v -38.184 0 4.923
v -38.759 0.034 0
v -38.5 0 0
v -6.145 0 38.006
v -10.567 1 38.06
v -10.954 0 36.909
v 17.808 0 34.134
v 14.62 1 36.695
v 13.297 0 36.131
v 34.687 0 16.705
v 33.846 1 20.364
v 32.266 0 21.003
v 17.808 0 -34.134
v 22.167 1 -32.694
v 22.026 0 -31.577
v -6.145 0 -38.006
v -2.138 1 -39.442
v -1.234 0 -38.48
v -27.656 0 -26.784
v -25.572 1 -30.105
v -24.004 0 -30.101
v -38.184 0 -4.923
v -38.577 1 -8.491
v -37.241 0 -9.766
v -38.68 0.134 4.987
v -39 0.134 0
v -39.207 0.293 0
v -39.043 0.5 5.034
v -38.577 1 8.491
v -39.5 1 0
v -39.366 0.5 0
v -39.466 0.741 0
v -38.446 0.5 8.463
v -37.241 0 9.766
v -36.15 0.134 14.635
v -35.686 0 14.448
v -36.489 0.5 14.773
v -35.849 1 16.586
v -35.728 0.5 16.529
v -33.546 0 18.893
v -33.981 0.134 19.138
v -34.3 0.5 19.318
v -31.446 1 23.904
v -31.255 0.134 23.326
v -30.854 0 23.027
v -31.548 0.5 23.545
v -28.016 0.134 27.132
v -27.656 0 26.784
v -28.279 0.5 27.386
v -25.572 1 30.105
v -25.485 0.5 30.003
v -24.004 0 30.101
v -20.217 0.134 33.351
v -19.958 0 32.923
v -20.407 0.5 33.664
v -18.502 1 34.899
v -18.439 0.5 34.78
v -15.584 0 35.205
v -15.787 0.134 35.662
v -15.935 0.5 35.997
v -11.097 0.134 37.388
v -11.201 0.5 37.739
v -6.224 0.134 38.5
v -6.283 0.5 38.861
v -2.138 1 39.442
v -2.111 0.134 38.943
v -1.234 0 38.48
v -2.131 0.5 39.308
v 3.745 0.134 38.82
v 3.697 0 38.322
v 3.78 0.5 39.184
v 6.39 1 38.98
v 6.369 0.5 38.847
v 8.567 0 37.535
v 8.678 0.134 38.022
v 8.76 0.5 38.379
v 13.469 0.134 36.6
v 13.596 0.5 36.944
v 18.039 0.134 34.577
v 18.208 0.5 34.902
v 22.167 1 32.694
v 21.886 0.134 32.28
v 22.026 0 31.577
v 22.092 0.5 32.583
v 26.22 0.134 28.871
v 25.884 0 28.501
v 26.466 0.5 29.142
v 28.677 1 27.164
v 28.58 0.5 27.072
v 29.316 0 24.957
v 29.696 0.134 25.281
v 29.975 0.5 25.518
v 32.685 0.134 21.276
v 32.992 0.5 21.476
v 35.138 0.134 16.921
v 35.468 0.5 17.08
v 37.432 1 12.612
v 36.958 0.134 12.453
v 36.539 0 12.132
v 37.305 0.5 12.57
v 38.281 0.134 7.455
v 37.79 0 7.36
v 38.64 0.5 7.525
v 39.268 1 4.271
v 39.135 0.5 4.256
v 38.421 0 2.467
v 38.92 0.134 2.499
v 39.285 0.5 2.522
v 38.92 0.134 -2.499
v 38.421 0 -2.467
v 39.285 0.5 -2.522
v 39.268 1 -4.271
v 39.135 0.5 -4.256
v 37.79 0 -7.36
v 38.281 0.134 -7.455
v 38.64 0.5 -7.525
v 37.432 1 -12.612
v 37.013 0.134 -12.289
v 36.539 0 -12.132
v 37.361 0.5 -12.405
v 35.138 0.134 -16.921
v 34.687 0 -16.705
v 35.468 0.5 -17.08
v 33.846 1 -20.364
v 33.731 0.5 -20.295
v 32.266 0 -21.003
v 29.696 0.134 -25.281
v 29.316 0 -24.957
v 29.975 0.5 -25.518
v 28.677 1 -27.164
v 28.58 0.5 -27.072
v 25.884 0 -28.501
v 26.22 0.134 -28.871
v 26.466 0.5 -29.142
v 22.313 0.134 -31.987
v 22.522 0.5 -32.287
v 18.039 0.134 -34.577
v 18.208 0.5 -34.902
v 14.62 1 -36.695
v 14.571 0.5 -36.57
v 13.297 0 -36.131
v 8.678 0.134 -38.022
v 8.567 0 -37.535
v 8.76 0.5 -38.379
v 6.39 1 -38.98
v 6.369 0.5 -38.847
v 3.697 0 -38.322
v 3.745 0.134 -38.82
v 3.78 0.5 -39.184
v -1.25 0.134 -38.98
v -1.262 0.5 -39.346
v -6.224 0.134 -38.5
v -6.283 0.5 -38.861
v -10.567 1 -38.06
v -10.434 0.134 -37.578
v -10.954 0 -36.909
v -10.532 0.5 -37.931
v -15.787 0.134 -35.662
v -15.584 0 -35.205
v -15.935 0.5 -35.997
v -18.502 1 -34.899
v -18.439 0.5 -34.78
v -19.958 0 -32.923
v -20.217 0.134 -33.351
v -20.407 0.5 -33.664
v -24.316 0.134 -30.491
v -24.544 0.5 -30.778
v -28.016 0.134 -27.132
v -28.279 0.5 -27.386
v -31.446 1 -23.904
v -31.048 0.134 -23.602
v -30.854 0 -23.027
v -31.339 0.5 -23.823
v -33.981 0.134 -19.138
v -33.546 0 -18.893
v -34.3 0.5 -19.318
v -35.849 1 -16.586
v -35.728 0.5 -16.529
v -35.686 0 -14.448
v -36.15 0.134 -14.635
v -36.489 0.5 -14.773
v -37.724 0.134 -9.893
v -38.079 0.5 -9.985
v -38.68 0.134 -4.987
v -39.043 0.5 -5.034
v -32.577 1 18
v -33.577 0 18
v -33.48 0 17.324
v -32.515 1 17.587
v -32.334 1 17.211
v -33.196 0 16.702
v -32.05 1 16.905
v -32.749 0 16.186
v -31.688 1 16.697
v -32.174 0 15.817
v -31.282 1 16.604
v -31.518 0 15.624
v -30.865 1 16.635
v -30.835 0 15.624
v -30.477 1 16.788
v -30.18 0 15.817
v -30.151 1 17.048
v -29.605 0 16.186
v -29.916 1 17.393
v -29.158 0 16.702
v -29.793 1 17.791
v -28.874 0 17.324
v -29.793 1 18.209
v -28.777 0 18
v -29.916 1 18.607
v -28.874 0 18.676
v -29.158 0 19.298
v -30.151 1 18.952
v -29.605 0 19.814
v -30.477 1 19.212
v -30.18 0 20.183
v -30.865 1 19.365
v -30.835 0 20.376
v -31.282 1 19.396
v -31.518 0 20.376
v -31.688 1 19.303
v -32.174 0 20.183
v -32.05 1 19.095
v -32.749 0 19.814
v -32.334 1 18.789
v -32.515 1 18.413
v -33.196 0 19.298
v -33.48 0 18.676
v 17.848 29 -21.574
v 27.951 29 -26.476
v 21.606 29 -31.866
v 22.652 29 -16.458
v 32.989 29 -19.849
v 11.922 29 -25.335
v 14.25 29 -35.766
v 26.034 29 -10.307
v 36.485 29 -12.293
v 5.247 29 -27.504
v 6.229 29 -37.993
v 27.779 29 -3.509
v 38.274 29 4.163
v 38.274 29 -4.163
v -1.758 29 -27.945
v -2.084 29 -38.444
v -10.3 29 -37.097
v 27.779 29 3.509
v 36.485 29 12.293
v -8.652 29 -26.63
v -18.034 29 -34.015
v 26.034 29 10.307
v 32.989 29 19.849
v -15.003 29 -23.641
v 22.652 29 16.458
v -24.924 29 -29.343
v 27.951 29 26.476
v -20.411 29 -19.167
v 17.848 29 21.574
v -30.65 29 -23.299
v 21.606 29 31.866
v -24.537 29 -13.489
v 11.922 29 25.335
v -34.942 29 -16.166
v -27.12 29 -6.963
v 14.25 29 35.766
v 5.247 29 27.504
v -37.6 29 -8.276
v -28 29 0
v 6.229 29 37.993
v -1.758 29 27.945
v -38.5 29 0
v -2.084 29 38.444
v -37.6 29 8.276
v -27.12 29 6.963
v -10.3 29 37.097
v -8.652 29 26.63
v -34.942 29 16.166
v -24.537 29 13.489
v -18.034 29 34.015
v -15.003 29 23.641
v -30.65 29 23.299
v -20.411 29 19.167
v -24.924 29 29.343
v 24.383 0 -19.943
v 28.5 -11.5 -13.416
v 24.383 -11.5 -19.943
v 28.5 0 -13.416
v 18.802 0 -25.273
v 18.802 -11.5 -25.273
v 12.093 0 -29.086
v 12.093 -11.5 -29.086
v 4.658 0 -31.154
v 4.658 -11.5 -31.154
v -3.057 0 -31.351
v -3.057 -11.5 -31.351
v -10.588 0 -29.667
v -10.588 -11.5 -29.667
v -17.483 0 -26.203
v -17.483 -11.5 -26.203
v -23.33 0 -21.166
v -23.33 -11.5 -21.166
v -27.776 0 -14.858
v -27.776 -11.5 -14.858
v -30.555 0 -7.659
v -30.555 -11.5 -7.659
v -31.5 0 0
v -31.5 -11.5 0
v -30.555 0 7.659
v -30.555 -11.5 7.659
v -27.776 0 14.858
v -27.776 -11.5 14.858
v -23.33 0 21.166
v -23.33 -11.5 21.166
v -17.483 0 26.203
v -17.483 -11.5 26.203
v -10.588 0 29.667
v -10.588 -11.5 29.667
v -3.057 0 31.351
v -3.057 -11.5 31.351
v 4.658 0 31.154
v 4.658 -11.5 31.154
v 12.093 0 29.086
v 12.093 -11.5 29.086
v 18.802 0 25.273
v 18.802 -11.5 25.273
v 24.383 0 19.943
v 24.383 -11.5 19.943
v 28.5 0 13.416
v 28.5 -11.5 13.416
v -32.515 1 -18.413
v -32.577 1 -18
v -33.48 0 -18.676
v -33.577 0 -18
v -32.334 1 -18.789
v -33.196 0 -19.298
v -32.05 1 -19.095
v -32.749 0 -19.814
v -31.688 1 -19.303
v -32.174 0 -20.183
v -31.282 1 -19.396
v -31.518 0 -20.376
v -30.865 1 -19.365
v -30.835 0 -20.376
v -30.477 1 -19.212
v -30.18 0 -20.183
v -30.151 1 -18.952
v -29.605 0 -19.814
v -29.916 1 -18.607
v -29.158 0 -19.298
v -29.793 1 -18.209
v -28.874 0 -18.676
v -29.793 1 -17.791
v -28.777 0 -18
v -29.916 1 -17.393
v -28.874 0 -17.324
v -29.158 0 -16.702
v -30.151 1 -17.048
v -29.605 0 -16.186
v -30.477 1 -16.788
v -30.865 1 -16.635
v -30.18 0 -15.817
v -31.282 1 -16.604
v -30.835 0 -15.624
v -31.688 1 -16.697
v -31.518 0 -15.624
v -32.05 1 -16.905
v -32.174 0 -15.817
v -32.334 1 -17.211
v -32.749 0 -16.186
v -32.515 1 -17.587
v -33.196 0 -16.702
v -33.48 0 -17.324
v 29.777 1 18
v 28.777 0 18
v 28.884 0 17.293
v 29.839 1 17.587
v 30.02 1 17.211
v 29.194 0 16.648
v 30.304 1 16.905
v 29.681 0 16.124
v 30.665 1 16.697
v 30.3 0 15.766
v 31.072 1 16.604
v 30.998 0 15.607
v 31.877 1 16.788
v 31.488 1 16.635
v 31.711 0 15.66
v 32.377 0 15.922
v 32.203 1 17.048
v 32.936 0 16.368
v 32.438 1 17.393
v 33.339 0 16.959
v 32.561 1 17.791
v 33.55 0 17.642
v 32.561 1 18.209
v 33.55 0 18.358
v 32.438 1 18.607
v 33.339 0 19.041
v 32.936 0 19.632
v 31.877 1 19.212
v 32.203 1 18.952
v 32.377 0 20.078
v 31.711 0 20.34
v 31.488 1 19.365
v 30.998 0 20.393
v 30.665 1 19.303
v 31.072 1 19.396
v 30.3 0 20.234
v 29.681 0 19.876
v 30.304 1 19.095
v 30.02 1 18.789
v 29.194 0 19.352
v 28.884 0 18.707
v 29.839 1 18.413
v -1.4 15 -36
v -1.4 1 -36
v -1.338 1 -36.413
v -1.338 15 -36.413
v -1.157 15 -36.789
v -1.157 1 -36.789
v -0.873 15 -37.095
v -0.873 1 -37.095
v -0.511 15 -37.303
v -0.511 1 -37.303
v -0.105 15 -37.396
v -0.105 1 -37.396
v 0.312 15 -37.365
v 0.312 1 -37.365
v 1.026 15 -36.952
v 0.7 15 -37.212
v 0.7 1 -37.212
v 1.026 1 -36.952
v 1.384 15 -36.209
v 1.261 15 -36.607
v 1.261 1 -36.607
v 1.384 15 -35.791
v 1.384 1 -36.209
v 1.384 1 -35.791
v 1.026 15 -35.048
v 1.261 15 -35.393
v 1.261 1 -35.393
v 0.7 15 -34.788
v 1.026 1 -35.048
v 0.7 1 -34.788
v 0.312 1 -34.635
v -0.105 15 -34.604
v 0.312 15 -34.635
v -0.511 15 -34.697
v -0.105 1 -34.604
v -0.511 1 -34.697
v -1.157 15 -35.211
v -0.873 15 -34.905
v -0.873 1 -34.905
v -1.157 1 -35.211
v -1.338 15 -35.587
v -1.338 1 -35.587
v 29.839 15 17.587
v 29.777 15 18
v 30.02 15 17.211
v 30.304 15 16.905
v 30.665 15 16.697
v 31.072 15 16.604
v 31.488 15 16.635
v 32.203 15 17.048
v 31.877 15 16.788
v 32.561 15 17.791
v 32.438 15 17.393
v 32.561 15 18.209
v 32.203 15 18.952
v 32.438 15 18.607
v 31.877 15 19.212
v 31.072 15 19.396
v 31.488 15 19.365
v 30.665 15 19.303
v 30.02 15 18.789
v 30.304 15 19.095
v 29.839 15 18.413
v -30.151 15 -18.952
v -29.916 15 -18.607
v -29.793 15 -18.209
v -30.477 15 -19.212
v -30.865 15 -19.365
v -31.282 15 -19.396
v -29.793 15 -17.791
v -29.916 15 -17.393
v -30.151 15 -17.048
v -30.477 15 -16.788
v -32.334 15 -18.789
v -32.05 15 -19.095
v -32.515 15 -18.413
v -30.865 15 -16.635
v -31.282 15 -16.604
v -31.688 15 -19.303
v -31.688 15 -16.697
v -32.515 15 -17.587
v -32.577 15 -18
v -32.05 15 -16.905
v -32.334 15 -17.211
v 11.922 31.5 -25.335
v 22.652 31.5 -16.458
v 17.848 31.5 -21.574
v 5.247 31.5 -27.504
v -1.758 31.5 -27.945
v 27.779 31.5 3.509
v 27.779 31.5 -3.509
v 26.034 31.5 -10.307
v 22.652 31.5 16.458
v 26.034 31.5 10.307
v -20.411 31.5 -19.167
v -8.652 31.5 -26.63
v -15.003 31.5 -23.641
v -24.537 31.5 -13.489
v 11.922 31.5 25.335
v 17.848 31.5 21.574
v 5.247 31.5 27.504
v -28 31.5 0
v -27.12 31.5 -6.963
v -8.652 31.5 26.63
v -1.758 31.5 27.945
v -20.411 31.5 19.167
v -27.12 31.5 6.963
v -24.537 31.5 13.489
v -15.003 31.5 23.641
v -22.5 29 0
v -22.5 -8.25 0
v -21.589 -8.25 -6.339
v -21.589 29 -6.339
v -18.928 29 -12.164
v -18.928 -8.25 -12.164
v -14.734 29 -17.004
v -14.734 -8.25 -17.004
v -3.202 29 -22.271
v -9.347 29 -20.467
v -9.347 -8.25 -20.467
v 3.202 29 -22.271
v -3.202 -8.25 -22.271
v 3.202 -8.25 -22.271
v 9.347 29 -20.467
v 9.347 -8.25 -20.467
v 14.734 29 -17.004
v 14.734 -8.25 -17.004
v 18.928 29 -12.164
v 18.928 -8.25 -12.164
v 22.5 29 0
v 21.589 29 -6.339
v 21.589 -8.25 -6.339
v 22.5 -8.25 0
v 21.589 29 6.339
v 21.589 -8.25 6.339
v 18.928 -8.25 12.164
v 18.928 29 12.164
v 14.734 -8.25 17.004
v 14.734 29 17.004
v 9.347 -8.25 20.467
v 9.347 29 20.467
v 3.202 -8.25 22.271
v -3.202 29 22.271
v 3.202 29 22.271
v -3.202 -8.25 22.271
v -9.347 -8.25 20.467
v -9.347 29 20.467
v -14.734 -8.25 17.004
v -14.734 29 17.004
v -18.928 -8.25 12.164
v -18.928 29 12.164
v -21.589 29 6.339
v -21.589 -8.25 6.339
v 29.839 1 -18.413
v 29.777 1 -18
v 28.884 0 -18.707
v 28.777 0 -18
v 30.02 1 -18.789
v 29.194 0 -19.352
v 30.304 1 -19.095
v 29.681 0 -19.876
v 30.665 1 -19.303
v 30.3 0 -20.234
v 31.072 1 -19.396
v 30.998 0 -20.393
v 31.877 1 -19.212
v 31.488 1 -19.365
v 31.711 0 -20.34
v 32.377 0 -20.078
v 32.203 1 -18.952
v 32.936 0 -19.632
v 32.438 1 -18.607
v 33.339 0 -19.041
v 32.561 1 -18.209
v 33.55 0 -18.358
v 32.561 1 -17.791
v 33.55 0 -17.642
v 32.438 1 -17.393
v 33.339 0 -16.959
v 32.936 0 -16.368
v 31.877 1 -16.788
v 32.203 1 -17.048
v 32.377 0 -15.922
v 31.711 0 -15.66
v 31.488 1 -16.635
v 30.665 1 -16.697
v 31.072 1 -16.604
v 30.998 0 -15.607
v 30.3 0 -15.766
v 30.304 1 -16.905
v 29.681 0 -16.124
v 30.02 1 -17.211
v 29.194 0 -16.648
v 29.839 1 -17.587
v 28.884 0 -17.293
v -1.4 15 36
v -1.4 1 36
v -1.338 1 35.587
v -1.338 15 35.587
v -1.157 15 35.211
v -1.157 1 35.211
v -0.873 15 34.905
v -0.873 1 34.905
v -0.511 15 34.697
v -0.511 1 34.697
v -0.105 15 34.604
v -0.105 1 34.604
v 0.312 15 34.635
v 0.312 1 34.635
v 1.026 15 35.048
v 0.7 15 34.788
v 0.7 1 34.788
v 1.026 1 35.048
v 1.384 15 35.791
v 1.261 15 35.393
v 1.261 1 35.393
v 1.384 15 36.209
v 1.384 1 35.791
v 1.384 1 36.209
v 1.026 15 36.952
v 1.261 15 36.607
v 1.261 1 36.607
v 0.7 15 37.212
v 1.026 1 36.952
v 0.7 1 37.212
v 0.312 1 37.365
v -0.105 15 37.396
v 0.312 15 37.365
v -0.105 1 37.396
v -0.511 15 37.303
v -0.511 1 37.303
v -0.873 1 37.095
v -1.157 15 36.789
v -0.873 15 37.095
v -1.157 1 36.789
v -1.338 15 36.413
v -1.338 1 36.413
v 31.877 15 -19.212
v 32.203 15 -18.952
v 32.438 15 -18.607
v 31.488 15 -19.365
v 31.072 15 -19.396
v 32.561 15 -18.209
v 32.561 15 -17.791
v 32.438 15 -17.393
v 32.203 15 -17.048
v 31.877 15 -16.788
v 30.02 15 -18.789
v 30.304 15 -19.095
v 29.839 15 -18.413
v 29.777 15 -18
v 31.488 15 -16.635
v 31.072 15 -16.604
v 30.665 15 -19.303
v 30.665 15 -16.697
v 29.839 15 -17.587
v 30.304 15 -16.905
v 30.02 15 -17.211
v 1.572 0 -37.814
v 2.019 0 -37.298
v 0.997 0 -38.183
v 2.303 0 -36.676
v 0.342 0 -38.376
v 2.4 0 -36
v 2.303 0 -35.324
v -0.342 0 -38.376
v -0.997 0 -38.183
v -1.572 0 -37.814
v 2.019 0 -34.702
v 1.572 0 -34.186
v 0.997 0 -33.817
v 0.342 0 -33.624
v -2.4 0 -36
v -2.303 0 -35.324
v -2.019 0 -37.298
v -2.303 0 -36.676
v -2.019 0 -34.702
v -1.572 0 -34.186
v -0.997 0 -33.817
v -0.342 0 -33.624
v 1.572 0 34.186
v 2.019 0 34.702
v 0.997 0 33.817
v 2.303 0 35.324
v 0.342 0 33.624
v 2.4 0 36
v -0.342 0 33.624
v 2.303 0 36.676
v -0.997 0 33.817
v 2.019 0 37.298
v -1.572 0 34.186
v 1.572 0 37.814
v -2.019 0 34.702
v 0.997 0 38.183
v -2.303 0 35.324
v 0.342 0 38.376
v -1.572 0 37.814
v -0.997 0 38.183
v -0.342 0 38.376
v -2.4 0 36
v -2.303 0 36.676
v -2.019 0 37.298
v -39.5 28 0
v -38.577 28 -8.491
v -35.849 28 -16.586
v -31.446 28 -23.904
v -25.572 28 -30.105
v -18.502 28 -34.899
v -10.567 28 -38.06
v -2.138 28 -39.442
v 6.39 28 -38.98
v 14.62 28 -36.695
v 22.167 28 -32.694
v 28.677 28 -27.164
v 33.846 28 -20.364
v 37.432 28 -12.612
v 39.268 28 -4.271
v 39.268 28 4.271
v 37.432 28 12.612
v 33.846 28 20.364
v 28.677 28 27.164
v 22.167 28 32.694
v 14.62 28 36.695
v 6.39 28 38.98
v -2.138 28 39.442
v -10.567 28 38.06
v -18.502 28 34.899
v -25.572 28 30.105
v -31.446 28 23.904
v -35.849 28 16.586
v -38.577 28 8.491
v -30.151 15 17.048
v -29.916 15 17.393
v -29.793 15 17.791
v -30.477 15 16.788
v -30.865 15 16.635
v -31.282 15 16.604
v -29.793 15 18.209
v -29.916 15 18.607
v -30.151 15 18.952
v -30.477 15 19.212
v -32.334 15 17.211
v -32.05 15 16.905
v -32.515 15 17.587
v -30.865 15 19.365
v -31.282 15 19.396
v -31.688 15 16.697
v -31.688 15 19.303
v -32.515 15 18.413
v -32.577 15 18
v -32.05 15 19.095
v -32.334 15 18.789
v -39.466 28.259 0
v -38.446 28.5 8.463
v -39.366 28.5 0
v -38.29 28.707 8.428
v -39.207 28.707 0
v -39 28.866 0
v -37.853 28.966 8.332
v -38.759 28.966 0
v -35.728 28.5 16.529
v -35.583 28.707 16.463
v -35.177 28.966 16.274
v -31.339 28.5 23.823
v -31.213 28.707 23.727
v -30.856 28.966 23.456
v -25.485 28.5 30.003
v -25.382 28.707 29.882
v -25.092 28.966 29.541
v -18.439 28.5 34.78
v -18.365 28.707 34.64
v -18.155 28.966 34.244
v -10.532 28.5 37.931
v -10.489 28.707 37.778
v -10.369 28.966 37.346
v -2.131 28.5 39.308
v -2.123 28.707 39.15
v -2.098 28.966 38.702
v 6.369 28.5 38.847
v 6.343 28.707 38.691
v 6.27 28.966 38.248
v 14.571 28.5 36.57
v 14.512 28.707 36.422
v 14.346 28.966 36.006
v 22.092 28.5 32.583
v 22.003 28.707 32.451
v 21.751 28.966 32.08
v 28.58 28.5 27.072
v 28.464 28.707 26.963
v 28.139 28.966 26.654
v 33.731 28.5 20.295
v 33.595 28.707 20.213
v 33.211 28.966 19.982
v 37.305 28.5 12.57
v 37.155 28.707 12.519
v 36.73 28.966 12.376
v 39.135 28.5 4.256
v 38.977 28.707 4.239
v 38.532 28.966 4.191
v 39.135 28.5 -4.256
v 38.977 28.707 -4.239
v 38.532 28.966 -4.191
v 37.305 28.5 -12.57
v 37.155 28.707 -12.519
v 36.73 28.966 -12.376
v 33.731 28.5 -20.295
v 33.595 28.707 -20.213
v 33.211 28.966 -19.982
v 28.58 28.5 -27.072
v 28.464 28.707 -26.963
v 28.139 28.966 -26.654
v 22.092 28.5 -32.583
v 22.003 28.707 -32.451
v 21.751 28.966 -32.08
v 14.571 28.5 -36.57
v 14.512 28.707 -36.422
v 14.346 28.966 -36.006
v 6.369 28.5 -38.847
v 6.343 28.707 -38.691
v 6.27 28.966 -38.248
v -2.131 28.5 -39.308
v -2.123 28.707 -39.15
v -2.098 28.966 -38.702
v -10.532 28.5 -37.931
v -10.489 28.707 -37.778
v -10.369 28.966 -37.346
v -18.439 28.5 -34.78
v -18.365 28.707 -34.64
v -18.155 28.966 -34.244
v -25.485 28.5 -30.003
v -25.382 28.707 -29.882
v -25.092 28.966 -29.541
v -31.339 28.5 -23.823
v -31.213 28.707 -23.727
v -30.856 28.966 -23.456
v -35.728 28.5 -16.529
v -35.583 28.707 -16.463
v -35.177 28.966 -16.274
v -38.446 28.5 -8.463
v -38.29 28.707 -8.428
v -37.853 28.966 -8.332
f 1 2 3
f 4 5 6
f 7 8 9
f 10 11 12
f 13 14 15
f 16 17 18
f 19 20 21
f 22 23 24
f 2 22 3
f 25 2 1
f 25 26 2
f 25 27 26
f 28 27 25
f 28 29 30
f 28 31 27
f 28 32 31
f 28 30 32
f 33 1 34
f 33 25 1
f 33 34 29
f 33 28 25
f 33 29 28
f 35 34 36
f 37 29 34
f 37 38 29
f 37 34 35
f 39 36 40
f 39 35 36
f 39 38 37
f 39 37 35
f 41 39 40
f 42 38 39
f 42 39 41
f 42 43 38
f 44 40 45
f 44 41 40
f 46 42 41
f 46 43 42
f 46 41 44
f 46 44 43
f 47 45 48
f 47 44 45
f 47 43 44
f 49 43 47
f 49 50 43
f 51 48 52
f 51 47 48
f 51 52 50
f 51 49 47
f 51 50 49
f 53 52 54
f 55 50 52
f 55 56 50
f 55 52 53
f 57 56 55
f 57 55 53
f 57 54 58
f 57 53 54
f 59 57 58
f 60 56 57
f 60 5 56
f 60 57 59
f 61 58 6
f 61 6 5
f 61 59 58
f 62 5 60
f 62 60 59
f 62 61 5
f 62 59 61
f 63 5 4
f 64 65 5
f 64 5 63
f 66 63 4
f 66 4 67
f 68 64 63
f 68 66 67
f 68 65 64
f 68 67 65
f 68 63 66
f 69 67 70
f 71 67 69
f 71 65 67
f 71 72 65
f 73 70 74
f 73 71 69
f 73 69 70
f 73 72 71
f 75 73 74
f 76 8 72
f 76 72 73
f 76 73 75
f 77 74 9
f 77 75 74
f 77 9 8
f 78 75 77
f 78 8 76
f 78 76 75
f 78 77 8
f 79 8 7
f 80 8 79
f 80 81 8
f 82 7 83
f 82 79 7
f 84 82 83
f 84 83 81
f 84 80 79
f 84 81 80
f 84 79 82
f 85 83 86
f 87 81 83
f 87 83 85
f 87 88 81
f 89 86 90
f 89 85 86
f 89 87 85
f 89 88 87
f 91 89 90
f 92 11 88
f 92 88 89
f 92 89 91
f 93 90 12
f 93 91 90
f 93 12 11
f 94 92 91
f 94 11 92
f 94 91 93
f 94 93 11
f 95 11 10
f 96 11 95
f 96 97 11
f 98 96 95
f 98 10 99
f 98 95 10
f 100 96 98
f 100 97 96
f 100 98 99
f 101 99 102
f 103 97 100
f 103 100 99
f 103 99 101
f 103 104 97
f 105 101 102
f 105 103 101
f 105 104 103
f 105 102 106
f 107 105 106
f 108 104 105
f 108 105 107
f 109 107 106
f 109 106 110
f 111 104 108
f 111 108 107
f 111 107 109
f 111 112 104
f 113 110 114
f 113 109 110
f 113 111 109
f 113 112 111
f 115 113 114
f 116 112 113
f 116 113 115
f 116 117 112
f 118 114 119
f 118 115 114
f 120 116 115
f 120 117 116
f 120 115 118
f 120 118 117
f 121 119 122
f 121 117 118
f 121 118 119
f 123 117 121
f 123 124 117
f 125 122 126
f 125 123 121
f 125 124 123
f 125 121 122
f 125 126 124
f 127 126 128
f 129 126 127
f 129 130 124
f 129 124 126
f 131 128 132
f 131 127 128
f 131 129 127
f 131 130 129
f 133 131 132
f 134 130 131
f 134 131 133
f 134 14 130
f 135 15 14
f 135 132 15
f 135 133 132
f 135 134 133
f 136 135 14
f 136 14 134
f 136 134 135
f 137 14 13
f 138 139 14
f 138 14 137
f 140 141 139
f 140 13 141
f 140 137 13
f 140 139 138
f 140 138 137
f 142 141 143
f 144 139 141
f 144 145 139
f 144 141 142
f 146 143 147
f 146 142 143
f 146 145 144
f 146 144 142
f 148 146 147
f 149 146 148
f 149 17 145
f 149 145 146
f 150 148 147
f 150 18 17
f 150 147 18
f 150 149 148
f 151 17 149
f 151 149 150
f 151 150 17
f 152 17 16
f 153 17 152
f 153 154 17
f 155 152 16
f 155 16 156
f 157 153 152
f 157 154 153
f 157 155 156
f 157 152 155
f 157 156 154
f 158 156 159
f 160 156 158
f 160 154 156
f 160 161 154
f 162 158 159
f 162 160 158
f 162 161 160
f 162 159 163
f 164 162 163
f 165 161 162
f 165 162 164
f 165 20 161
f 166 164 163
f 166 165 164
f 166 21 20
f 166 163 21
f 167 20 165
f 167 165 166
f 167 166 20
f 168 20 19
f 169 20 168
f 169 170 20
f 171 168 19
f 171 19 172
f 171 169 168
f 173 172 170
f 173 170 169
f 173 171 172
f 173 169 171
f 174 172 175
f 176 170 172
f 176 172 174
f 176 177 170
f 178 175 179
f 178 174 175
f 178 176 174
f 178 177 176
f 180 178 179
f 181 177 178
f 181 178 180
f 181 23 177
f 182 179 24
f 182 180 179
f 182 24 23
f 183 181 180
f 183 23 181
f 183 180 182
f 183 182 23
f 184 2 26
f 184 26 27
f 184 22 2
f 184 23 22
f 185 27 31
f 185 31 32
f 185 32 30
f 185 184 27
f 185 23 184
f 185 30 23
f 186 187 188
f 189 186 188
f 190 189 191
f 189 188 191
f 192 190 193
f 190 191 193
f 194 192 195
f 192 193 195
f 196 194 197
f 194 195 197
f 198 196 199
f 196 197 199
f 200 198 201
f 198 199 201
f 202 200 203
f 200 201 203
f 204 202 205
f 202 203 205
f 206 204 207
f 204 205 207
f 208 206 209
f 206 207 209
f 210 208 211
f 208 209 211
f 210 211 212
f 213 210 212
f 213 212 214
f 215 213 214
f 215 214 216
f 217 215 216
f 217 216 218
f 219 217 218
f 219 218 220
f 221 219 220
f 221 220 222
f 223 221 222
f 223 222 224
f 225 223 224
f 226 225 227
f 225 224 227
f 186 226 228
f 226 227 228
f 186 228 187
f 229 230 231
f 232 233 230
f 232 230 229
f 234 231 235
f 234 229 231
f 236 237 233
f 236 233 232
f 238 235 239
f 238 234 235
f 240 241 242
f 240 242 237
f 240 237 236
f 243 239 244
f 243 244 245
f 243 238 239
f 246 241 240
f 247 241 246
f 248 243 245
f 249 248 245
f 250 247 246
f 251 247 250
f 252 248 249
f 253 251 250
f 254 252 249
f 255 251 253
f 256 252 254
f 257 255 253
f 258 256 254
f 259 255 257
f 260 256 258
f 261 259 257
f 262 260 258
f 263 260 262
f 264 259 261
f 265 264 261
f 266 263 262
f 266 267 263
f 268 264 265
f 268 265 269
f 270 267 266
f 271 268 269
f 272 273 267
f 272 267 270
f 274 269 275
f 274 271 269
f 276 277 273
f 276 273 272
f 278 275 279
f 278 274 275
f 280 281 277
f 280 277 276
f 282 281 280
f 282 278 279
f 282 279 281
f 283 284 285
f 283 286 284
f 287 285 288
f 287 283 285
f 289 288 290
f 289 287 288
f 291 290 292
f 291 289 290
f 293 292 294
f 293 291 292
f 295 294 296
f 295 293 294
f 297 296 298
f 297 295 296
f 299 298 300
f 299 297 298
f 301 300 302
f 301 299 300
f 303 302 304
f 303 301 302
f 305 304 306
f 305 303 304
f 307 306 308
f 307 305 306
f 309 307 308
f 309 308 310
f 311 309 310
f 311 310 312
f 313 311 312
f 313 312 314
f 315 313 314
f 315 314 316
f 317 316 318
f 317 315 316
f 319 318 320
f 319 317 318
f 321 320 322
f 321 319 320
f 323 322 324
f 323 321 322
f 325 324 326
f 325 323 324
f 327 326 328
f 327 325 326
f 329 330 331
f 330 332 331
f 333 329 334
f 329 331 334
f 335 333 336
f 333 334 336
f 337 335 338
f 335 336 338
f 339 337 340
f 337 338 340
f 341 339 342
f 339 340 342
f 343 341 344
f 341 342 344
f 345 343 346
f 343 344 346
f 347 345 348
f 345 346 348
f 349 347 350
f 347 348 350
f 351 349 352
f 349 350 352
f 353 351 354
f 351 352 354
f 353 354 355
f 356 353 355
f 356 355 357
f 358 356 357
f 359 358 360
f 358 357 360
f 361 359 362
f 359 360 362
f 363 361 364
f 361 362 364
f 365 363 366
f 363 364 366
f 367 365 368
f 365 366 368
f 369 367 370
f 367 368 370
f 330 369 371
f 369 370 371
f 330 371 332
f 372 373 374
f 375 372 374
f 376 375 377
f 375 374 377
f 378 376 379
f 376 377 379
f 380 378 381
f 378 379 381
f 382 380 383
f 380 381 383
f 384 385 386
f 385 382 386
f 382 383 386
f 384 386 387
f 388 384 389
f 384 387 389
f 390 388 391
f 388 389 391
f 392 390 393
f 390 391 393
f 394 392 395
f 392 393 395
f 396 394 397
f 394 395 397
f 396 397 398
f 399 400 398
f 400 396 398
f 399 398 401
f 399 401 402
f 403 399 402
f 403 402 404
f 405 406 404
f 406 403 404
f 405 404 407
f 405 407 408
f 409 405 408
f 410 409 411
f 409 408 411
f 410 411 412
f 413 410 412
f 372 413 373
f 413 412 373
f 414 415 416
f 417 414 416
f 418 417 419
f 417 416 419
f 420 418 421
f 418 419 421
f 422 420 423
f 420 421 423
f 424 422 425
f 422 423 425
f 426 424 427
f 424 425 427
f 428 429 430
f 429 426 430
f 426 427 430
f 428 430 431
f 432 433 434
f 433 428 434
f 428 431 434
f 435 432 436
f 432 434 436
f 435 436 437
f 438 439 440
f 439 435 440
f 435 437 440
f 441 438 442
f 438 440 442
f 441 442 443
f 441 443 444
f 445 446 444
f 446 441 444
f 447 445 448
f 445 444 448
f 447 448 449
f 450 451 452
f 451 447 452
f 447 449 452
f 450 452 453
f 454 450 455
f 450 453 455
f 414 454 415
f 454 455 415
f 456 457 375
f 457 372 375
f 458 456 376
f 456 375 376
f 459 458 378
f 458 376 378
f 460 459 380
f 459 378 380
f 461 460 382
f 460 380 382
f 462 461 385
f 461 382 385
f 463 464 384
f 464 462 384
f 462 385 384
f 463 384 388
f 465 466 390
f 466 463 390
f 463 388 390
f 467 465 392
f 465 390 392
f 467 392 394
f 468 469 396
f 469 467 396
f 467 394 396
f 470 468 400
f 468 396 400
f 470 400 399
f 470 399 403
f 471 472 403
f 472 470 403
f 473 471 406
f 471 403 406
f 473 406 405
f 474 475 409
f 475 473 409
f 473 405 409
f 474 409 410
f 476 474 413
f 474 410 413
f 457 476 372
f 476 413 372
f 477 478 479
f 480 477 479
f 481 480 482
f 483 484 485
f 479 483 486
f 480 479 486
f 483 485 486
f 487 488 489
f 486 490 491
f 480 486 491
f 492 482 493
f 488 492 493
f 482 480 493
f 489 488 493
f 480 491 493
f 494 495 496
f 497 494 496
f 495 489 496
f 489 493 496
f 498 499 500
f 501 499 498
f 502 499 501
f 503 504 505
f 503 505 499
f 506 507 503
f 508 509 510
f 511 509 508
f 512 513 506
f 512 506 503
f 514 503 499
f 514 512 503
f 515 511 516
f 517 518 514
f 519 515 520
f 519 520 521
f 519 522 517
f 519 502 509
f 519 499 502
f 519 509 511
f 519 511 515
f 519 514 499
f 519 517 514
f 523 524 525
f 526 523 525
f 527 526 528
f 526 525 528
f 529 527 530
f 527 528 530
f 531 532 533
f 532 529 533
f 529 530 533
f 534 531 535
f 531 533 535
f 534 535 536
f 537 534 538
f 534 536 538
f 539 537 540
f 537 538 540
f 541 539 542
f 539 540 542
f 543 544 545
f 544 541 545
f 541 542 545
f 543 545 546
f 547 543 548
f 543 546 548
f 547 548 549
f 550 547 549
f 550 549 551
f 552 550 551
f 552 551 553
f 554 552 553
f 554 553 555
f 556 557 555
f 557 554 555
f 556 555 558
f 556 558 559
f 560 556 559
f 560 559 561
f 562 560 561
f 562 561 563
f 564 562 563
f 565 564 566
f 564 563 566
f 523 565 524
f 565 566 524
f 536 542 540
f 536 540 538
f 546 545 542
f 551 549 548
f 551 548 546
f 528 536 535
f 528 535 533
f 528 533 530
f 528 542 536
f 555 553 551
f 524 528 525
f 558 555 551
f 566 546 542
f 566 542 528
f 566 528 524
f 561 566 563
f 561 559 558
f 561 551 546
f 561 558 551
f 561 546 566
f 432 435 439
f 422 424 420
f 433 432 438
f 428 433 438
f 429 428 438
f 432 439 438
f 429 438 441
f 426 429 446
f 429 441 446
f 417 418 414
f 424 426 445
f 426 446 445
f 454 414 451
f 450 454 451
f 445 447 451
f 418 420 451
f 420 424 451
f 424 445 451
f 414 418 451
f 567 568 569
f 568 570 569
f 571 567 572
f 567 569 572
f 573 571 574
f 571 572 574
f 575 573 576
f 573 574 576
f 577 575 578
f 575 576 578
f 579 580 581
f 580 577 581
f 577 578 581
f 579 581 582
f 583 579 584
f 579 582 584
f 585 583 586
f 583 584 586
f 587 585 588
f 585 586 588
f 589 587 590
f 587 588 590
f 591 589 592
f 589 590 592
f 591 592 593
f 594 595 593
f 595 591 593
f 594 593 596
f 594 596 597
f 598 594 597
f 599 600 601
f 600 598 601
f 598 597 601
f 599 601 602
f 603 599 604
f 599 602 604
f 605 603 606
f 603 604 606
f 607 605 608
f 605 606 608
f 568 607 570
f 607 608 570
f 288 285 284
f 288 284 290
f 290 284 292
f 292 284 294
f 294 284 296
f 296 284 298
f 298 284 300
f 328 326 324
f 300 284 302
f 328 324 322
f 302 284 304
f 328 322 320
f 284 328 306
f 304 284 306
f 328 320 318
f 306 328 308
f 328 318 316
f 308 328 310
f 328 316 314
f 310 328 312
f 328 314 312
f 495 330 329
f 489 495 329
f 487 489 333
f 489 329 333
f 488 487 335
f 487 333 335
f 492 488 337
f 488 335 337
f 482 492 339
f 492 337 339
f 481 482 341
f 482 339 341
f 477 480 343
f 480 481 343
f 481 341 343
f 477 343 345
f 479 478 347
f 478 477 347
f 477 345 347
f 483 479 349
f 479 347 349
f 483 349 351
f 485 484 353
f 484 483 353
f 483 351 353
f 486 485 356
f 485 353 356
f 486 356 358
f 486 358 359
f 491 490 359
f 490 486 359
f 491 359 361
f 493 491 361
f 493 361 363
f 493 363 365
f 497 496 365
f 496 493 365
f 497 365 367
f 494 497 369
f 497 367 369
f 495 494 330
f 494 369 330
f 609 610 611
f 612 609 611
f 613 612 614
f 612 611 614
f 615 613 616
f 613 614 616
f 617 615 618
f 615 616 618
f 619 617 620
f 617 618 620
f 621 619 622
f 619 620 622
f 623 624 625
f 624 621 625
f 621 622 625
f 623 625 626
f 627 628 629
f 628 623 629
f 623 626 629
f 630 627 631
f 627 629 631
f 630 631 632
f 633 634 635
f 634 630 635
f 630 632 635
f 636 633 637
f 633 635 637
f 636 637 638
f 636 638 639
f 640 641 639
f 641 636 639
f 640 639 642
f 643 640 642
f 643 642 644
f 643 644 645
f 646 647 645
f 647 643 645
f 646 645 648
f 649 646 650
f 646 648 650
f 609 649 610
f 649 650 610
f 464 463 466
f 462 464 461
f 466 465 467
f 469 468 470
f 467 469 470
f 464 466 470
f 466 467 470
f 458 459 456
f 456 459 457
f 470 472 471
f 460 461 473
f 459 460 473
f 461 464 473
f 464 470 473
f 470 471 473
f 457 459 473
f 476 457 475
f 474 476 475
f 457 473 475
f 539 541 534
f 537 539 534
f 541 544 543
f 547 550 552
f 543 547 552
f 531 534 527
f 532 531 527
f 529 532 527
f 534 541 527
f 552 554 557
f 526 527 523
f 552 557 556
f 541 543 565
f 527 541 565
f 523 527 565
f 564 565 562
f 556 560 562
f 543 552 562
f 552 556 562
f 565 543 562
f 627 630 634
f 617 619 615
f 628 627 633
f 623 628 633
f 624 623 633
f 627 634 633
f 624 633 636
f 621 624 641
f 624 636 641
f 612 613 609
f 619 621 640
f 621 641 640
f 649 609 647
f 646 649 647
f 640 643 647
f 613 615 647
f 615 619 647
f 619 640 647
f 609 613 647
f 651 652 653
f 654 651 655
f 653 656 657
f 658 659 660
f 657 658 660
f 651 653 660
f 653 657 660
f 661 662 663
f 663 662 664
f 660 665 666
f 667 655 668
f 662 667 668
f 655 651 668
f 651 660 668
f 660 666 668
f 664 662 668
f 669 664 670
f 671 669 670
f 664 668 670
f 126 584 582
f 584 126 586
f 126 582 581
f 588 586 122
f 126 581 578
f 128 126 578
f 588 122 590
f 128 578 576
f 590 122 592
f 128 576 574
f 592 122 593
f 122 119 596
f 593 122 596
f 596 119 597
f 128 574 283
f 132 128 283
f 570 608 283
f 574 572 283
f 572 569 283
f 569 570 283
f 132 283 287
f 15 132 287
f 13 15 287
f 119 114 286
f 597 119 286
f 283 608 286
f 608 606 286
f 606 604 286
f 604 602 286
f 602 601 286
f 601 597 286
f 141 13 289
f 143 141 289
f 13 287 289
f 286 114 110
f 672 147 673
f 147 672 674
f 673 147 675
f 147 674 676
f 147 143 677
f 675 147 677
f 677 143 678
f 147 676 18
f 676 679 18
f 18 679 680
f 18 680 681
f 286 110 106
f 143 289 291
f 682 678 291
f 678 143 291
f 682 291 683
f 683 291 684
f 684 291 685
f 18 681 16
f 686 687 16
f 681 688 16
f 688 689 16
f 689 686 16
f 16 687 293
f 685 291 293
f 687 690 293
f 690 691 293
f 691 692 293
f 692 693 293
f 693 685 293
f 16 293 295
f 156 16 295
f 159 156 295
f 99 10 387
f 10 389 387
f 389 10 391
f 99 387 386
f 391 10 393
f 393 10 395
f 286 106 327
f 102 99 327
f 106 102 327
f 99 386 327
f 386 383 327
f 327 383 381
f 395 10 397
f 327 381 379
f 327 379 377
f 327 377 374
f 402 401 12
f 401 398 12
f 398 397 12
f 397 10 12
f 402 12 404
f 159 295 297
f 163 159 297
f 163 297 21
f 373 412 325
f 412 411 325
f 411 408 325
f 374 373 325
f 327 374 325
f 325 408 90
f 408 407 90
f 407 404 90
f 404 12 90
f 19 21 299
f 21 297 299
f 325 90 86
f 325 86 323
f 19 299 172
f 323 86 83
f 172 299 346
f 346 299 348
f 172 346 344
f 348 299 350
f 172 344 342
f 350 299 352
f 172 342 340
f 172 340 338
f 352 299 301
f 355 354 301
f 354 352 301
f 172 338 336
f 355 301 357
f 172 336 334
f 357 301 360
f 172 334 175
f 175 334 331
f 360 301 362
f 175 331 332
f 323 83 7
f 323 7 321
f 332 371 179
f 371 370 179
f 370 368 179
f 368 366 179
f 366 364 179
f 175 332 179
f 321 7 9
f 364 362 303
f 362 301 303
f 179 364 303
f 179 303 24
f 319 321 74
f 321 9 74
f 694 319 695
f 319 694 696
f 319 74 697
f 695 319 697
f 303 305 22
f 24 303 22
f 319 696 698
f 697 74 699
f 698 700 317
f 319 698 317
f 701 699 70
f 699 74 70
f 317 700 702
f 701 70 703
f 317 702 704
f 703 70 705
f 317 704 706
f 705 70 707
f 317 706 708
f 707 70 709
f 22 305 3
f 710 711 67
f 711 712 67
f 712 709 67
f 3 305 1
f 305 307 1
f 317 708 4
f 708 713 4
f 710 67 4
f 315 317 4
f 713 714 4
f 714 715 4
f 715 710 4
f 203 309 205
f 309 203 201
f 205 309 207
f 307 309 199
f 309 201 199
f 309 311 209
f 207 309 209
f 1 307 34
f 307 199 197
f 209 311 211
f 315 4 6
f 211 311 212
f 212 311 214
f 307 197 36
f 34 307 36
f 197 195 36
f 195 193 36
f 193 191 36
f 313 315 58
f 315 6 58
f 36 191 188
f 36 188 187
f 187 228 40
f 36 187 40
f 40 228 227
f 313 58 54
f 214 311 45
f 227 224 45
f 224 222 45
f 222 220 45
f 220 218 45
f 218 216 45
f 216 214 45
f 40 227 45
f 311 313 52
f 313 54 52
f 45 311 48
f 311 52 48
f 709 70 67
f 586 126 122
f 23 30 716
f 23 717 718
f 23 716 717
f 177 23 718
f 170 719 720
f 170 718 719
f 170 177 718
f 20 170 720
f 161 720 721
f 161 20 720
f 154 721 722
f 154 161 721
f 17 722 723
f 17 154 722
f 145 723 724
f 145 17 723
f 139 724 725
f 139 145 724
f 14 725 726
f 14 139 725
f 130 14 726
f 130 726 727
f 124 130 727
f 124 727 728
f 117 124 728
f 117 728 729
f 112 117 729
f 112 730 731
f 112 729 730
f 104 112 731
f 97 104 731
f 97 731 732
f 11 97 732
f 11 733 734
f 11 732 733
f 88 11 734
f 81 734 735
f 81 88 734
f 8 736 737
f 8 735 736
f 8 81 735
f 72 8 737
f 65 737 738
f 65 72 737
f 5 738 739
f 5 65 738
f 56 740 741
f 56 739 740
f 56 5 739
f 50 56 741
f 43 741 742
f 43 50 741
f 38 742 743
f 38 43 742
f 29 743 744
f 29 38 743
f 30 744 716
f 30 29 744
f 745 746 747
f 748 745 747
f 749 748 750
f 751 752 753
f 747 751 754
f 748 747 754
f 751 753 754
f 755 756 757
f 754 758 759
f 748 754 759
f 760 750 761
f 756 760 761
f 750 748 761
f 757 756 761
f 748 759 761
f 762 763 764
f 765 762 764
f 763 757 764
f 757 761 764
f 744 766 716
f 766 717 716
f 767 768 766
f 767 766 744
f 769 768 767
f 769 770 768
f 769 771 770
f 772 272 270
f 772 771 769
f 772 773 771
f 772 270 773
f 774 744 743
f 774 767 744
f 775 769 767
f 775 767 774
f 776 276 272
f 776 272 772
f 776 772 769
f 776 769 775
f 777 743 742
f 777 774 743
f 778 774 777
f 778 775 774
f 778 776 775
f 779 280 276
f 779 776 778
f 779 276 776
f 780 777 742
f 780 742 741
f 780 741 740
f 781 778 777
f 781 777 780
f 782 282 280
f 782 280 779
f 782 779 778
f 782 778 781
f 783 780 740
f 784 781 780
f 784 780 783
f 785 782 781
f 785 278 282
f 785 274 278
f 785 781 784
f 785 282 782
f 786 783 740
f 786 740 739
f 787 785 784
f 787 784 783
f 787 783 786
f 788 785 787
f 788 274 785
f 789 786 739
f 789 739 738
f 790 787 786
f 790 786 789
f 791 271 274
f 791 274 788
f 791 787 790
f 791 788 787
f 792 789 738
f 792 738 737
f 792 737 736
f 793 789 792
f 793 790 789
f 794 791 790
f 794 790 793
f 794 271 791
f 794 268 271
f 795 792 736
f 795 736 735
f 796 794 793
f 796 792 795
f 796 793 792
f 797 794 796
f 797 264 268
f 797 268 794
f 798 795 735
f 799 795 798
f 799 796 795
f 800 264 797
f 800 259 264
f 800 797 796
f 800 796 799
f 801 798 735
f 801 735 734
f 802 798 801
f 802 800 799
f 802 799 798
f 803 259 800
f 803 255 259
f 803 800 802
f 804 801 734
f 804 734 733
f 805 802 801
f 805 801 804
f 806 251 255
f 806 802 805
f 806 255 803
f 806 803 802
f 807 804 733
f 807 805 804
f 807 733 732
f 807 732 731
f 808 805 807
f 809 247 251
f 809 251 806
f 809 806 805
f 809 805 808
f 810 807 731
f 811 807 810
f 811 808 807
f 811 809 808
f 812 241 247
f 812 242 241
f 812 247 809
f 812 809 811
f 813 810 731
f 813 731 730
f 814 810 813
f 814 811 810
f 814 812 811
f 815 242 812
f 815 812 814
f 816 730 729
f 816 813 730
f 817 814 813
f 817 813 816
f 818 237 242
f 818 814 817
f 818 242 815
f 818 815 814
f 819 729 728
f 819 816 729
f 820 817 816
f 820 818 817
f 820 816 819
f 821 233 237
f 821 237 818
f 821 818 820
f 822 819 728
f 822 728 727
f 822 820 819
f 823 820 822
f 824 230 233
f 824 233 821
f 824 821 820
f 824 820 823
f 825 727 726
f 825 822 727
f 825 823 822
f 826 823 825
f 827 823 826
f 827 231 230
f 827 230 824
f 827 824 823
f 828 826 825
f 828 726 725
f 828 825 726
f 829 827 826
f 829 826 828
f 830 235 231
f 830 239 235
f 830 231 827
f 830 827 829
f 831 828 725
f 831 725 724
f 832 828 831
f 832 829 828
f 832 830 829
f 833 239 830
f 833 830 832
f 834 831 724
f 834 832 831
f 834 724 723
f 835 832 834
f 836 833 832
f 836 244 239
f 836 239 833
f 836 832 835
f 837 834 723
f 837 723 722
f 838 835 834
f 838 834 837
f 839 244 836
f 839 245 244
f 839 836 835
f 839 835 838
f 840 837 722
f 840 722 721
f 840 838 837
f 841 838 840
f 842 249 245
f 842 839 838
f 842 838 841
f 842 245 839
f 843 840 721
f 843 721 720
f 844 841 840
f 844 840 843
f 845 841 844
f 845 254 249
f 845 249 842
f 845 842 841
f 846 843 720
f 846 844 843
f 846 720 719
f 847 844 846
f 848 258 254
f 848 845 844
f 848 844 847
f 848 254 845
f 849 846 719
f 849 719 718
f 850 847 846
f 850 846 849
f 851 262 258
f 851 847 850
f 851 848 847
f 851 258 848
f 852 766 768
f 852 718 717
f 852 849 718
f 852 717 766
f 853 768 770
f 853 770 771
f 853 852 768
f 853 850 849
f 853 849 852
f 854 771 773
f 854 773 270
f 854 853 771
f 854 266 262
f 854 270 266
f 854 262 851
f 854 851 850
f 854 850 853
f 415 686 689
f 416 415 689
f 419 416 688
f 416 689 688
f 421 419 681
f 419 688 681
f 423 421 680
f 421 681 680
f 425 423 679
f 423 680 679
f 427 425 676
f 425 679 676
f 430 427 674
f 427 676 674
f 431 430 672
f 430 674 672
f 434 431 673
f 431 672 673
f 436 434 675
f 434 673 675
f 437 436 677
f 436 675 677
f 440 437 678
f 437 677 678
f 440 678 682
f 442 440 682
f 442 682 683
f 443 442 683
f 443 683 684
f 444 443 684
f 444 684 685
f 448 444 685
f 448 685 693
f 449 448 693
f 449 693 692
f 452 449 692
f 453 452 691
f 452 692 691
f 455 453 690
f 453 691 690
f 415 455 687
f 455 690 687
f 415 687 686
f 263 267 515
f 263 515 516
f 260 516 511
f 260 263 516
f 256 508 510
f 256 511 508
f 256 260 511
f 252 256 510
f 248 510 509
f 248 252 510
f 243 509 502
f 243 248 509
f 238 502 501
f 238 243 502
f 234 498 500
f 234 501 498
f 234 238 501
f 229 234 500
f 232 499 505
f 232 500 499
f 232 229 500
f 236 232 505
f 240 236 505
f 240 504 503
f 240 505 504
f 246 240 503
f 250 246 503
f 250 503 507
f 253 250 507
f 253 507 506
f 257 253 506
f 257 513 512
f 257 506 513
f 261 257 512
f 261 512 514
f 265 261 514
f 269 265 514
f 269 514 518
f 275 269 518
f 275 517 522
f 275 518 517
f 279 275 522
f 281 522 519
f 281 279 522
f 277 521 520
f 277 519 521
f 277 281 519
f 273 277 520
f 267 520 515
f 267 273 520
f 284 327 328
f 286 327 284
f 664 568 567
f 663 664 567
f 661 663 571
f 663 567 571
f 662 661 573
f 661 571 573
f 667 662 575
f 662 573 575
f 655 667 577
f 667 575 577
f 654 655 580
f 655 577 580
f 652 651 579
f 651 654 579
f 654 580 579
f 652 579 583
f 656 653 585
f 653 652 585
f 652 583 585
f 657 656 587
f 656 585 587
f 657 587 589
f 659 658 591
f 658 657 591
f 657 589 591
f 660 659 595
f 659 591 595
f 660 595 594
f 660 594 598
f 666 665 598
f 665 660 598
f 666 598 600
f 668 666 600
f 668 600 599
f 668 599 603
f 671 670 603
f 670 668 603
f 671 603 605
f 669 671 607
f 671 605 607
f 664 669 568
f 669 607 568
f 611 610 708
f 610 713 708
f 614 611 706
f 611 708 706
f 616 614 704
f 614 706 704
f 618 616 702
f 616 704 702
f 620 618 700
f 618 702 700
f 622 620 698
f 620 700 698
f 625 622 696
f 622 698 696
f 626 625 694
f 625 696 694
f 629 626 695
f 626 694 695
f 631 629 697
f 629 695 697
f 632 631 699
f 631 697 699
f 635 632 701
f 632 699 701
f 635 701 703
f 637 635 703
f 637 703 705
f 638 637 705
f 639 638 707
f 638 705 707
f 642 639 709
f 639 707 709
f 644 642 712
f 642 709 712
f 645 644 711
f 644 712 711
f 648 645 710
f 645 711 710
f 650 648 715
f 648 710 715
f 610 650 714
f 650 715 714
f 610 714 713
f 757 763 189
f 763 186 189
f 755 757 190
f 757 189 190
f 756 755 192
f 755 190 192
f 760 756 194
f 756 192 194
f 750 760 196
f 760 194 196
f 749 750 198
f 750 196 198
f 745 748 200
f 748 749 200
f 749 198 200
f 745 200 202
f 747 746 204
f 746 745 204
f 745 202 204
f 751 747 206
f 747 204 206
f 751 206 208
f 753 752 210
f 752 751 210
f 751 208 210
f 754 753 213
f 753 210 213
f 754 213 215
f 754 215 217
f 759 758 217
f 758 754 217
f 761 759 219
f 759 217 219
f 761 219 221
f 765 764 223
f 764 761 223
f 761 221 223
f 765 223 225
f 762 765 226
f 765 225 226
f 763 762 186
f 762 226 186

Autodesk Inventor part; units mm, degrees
ref_plane "YZ Plane" through (0, 0, 0) normal (1, 0, 0) x (0, 1, 0)
ref_plane "XZ Plane" through (0, 0, 0) normal (0, 1, 0) x (-1, 0, 0)
ref_plane "XY Plane" through (0, 0, 0) normal (0, 0, 1) x (1, 0, 0)
sketch "Sketch1" plane through (0, 0, 0) normal (0, 1, 0) x (-1, 0, 0)
  circle A0 centre (0, 0) radius 39.5
  circle A1 centre (0, 0) radius 31.5
  circle A2 centre (0, 0) radius 28
  line L0 (-28.5, 13.4164) -> (-28.5, -13.4164)
  circle A3 centre (0, 0) radius 36 construction
  line L1 (0, 39.5) -> (0, 0) construction
  line L2 (0, 0) -> (-34.208, 19.75) construction
  circle A4 centre (0, 36) radius 1.4
  circle A5 centre (-31.1769, 18) radius 1.4
  line L3 (0, 0) -> (-39.5, 0) construction
  circle A6 centre (31.1769, 18) radius 1.4
  circle A7 centre (0, -36) radius 1.4
  circle A8 centre (-31.1769, -18) radius 1.4
  circle A9 centre (31.1769, -18) radius 1.4
  circle A10 centre (0, 0) radius 22.5
  dimension "d0" = 79
  dimension "d1" = 63
  dimension "d2" = 56
  dimension "d6" = 28.5
  dimension "d11" = 72
  dimension "d12" = 2.8
  dimension "d13" = 60
  dimension "d19" = 45
extrude "Extrusion1" add sketch "Sketch1" along normal blind 29 contours A0 | A1 L0 | L0 A1 | A2 | A4 | A5 | A6 | A7 | A8 | A9 | A10
extrude "Extrusion2" add sketch "Sketch1" against normal blind 11.5 contours A1 L0 | A2 | A10 picked at (29.747, 4.7866)
extrude "Extrusion3" add sketch "Sketch1" along normal blind 2.5 from surface at 29 contours A2 | A10
extrude "Extrusion4" cut sketch "Sketch1" along normal blind 15 contours A4 | A5 | A6 | A7 | A8 | A9
chamfer "Chamfer1" distance 1 angle 45 6 edges at (1.4, 0, -36) (-29.7769, 0, -18) (-29.7769, 0, 18) (32.5769, 0, -18) (32.5769, 0, 18) (1.4, 0, 36)
extrude "Extrusion5" cut sketch "Sketch1" along normal blind 29 and the other way blind 8.25 contours A10
fillet "Fillet1" radius 1 1 edges at (39.5, 0, 0)
fillet "Fillet2" radius 1 1 edges at (39.5, 29, 0)
properties part number "motor_simplified"
